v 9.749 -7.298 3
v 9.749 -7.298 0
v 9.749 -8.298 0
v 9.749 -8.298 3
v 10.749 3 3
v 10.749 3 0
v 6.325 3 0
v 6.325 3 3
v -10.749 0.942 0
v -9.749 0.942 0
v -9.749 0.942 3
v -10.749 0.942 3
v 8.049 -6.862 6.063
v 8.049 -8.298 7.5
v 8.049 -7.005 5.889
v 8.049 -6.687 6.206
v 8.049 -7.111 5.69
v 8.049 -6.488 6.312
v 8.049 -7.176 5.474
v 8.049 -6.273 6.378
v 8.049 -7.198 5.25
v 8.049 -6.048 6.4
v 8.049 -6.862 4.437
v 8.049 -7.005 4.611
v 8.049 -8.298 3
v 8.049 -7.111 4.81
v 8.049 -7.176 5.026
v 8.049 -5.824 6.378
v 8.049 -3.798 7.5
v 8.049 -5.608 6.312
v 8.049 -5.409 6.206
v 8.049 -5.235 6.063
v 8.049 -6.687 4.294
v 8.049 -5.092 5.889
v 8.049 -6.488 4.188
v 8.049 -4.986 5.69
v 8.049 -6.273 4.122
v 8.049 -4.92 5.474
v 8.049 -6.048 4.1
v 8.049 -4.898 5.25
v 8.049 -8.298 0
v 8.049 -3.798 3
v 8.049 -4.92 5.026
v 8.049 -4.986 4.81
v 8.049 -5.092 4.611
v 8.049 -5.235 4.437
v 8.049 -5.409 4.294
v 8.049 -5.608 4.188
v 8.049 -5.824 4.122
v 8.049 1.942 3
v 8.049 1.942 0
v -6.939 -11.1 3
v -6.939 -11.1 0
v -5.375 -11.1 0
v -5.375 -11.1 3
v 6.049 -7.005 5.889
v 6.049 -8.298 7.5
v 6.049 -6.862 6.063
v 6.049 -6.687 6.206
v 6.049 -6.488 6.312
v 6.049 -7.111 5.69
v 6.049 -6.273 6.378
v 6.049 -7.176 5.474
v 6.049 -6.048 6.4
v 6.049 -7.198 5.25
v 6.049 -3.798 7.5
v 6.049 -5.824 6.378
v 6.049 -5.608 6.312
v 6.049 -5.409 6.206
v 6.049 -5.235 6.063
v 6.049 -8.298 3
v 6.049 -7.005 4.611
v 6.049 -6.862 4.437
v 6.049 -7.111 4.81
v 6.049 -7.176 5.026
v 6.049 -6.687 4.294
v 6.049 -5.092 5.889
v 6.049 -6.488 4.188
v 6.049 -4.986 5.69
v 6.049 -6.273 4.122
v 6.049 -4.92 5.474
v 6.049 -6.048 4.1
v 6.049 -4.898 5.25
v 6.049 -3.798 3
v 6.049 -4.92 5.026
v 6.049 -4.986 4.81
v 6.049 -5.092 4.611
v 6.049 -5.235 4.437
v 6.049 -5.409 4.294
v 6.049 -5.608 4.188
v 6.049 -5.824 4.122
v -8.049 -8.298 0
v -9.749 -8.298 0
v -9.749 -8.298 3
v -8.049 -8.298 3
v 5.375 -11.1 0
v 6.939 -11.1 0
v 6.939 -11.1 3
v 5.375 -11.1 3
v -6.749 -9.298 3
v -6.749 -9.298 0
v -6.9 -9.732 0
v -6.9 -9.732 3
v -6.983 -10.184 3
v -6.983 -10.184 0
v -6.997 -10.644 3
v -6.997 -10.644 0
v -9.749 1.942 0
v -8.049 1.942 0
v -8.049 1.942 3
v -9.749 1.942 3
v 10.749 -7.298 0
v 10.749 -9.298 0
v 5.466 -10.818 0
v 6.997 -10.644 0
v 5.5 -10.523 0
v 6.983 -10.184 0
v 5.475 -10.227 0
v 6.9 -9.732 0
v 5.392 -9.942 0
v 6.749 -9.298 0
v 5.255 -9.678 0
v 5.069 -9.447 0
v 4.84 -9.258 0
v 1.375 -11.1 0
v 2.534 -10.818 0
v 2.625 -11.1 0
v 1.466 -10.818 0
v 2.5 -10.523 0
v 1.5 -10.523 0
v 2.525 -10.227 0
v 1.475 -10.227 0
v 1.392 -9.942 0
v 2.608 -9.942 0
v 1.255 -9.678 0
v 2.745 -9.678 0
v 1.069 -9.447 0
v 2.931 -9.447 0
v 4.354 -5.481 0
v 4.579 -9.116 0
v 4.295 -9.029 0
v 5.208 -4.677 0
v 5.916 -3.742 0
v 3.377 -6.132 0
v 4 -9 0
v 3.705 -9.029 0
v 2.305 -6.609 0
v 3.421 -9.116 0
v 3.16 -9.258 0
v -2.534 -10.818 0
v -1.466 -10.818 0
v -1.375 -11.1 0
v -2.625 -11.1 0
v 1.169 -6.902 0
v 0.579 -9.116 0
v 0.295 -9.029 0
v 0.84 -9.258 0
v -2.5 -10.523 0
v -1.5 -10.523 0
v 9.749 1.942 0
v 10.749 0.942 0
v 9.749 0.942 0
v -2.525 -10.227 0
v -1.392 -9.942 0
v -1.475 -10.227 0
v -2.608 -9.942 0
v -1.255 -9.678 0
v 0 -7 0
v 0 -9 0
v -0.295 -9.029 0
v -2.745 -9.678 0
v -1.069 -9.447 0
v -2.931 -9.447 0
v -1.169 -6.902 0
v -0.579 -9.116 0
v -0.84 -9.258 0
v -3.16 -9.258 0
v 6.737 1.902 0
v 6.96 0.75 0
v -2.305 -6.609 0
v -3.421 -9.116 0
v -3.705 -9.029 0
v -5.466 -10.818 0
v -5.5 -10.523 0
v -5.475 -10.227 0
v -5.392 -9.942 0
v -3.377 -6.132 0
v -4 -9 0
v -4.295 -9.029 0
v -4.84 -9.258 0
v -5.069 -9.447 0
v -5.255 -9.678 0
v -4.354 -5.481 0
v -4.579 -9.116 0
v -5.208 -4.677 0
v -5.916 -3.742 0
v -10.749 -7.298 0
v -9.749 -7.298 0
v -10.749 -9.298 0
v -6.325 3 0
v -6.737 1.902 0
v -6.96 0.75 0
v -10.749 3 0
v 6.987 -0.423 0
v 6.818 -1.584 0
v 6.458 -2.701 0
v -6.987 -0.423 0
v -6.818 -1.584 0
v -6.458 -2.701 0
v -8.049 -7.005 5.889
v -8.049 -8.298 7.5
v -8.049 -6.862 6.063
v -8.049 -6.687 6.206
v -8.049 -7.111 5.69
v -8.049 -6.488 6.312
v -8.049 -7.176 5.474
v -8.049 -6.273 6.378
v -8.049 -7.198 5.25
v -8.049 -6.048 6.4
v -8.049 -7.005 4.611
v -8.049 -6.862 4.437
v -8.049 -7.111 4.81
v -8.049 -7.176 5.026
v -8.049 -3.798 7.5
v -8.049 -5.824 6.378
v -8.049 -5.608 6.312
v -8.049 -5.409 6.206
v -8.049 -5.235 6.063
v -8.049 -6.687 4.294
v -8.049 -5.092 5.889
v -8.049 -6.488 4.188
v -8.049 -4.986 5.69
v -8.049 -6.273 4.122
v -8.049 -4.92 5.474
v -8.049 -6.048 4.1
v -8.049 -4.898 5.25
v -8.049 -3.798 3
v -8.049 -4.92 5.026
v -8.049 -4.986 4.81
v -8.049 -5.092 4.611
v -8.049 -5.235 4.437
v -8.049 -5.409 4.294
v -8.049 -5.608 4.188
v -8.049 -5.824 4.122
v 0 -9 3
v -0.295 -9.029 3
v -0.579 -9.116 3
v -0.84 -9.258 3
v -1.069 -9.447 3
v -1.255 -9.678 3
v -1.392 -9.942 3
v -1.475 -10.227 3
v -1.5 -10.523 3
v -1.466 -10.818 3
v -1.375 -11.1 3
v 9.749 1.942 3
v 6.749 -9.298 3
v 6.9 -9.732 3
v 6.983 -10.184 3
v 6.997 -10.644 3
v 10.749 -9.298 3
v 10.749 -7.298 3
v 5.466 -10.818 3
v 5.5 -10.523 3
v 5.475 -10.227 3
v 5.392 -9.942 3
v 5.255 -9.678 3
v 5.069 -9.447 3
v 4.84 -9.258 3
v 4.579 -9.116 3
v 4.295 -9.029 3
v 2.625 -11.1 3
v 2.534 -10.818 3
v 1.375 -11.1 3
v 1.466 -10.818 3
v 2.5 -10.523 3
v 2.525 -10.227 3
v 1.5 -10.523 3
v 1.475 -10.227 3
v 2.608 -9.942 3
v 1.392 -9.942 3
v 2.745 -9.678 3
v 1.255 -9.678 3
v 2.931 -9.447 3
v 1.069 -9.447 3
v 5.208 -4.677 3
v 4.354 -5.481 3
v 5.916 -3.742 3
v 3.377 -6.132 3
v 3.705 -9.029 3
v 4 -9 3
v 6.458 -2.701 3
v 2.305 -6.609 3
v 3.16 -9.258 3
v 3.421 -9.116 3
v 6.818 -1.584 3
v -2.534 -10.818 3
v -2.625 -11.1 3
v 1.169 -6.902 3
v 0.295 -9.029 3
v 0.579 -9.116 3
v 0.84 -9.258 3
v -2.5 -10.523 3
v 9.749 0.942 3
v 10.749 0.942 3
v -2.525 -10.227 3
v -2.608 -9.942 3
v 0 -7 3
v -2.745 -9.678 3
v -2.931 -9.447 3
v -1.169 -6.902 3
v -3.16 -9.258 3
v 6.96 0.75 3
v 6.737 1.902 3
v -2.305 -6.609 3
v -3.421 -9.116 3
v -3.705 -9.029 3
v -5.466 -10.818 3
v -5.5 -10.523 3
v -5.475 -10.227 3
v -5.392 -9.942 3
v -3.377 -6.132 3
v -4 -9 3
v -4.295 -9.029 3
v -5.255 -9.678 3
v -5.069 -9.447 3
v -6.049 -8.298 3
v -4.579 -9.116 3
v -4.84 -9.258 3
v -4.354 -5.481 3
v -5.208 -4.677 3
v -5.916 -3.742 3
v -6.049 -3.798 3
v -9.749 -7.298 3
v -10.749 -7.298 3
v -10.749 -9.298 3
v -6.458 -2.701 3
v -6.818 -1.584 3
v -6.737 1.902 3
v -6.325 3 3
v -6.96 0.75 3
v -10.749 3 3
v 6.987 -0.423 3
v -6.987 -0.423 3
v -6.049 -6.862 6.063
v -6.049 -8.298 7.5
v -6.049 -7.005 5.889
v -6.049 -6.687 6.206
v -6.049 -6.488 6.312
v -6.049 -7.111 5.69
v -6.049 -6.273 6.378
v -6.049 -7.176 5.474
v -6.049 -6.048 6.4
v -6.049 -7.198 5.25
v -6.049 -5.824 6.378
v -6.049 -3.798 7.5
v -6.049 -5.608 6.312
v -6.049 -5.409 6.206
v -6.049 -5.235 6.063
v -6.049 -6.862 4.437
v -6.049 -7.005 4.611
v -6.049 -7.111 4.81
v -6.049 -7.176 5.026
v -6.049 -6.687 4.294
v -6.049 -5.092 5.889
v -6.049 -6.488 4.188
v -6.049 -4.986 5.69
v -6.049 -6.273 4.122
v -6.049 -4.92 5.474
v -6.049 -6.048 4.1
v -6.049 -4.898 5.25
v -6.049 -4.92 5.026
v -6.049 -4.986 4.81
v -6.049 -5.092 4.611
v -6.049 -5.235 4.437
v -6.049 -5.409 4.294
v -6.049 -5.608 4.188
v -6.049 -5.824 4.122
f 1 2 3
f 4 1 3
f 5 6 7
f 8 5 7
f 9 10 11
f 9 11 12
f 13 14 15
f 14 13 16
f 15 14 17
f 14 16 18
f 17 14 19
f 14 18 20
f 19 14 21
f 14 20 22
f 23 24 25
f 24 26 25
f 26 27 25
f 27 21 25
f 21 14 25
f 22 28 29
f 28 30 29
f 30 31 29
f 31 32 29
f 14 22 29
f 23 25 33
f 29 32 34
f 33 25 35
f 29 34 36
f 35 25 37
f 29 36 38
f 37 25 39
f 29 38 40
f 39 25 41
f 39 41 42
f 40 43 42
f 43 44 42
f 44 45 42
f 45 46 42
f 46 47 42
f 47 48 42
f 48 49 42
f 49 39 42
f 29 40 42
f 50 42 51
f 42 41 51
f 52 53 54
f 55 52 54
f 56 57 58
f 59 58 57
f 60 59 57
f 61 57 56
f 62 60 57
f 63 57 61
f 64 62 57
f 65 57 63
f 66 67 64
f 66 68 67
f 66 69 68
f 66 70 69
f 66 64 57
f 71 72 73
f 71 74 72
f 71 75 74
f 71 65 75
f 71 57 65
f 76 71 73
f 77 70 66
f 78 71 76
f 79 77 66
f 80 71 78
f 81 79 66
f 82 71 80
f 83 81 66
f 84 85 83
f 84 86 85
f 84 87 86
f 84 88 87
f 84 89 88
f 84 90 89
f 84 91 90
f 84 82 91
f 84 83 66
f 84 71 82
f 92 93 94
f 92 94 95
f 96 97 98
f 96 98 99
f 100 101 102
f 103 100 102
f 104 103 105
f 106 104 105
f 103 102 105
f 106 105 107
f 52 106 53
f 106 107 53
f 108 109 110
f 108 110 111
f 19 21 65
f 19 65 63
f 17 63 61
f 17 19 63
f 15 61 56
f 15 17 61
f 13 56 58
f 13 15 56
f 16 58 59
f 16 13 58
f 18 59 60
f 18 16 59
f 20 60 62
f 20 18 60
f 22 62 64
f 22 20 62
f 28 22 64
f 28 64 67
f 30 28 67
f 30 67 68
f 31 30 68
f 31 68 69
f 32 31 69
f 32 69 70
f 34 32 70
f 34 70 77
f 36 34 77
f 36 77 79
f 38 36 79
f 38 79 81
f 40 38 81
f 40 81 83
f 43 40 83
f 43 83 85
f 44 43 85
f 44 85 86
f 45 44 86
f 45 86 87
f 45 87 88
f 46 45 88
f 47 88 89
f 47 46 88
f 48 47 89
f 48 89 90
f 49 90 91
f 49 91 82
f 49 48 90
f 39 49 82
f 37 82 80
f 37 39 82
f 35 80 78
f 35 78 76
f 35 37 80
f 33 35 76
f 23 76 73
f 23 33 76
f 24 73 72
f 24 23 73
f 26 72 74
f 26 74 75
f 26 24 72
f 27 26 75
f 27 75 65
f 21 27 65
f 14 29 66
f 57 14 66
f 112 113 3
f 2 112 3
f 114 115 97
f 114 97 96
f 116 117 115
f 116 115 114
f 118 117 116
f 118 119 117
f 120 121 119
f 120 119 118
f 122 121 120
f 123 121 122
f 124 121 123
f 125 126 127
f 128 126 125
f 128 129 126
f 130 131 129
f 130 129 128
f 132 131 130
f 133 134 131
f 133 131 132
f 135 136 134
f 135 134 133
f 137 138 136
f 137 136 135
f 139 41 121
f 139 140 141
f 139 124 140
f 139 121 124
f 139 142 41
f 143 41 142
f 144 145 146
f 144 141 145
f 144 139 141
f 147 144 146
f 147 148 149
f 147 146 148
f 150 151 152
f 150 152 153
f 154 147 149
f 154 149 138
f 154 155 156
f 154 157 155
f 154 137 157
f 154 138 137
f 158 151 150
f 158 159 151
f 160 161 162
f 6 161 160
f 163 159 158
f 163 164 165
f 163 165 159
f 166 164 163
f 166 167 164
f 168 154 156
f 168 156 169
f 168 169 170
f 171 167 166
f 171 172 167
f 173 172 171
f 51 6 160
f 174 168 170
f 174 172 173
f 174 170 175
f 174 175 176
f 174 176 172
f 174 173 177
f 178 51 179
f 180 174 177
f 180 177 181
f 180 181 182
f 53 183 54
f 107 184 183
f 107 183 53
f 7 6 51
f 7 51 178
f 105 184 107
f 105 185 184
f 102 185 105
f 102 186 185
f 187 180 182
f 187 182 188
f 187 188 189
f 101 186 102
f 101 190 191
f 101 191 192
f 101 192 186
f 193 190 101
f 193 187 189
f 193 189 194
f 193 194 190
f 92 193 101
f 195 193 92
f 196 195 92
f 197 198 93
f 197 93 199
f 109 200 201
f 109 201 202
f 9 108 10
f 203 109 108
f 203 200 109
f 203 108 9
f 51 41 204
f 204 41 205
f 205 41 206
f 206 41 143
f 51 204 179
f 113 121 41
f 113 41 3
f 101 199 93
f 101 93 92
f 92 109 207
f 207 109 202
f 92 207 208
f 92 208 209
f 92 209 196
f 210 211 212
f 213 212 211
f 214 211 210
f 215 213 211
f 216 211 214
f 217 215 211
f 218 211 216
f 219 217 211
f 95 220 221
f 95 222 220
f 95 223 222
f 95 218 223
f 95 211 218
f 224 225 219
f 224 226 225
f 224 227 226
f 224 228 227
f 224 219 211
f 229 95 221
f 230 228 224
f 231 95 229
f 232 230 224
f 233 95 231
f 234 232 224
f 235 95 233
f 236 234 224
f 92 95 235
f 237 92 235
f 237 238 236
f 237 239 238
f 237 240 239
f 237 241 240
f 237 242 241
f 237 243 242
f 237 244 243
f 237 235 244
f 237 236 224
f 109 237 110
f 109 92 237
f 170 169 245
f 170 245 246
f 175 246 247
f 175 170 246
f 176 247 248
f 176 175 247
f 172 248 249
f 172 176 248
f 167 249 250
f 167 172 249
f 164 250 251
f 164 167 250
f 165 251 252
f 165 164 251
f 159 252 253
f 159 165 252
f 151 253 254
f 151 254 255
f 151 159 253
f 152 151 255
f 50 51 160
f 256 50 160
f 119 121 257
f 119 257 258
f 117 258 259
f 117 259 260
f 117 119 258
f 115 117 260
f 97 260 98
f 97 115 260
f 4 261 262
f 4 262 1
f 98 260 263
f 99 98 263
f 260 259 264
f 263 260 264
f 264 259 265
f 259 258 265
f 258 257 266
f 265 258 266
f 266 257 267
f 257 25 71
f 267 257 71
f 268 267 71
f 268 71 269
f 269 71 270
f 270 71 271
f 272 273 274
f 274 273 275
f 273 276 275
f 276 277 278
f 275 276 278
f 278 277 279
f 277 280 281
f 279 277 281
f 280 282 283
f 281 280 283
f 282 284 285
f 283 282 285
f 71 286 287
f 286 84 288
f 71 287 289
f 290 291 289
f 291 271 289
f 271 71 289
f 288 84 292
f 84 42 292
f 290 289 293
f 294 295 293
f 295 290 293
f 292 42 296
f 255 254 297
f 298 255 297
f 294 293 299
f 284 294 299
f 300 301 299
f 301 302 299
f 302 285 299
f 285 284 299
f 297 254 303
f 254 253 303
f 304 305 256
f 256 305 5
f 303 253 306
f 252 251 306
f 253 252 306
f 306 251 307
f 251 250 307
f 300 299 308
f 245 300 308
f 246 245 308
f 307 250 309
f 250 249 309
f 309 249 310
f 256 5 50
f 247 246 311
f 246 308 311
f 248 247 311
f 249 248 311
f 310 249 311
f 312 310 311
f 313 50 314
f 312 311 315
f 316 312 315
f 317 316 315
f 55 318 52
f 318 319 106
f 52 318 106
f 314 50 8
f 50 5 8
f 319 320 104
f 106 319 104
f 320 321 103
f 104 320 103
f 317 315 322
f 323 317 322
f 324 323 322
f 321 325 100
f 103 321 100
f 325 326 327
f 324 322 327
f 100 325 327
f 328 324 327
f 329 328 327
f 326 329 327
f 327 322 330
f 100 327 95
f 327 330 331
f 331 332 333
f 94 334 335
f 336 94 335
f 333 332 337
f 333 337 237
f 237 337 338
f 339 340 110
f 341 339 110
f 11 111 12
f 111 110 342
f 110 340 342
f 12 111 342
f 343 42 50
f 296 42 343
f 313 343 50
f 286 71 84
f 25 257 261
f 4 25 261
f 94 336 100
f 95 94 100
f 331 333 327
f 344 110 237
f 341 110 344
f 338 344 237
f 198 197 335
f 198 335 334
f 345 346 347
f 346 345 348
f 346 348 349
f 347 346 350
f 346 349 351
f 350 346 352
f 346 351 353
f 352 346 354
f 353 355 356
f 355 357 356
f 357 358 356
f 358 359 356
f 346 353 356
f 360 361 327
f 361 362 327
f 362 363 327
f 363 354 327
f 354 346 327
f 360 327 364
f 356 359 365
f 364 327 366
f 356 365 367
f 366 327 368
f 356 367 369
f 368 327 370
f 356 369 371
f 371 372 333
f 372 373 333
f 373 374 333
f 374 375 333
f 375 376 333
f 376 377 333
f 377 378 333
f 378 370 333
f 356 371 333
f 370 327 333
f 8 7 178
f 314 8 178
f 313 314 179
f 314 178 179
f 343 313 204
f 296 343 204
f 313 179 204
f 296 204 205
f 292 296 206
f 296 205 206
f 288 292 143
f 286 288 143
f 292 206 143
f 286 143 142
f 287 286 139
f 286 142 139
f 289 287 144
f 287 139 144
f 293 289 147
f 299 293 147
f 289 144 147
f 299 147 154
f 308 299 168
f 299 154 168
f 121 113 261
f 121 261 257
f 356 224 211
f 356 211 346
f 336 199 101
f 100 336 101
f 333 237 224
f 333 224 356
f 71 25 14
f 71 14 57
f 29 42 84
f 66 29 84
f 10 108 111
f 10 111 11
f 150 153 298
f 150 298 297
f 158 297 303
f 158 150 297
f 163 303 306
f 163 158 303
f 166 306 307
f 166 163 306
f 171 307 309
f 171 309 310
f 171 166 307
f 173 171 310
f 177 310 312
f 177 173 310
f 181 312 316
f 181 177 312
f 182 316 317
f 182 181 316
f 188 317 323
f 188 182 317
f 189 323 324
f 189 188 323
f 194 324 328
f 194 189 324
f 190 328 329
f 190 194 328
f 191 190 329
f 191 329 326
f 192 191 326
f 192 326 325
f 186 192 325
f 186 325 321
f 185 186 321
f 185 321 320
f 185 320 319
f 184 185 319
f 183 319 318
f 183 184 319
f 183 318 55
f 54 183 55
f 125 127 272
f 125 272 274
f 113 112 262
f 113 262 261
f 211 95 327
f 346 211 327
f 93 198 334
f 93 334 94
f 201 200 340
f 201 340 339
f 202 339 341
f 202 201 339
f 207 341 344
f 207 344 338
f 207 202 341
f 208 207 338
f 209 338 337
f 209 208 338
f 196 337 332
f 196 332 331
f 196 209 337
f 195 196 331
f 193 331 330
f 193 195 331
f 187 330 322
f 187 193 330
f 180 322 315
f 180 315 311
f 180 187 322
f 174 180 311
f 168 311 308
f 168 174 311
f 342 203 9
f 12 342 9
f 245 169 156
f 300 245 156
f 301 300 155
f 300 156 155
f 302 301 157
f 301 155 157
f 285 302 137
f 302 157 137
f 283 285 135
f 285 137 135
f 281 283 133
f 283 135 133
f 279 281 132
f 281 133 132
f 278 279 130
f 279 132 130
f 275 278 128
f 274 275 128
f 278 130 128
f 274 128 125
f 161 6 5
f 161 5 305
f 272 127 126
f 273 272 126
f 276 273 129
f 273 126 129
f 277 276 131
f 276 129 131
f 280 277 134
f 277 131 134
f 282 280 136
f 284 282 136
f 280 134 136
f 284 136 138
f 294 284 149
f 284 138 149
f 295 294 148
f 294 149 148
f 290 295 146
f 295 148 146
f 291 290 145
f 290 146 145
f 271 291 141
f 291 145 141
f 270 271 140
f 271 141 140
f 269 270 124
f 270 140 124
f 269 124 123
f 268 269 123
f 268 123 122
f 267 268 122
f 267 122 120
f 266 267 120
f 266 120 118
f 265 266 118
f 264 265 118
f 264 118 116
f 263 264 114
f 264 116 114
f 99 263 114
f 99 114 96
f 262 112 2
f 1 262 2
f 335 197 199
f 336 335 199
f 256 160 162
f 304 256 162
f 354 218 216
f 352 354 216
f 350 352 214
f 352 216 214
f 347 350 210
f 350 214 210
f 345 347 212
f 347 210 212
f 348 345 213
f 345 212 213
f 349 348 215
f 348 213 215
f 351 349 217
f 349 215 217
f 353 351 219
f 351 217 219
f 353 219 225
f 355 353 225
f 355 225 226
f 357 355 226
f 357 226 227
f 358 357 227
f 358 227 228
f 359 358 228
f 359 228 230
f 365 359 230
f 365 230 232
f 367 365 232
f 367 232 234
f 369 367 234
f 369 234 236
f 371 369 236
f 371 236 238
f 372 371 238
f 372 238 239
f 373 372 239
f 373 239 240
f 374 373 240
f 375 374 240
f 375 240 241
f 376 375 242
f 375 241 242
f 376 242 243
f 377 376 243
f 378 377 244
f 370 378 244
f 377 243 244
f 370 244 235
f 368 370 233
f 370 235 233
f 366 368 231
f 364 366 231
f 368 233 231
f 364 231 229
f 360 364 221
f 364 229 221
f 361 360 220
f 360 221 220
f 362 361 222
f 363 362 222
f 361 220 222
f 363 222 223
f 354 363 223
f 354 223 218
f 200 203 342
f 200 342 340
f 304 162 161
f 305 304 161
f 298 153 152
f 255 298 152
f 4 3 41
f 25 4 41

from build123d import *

# Parameters (mm, degrees)
PAD_DEPTH    = 3
SKETCH001_W  = 2
SKETCH001_H  = 4.5
PAD001_DEPTH = 4.5
SKETCH002_R  = 1.15
POCKET_DEPTH = 5


with BuildPart() as pocket:
    # Sketch → Pad (new body)
    with BuildSketch(Plane.XY):
        with BuildLine():
            ThreePointArc((-6.324555, 3), (-5.91608, -3.741657), (0, -7))
            Line((0, -7), (0, -9))
            ThreePointArc((0, -9), (-1.25499, -9.678416), (-1.374773, -11.1))
            Line((-2.625227, -11.1), (-1.374773, -11.1))
            ThreePointArc((-2.625227, -11.1), (-4, -9), (-5.374773, -11.1))
            Line((-6.939388, -11.1), (-5.374773, -11.1))
            ThreePointArc((-6.748835, -9.298374), (-6.98336, -10.184459), (-6.939388, -11.1))
            Line((-10.748835, -9.298374), (-6.748835, -9.298374))
            Line((-10.748835, -7.298374), (-10.748835, -9.298374))
            Line((-10.748835, -7.298374), (-9.748835, -7.298374))
            Line((-9.748835, -7.298374), (-9.748835, -8.298374))
            Line((-9.748835, -8.298374), (-8.048835, -8.298374))
            Line((-8.048835, 1.941626), (-8.048835, -8.298374))
            Line((-8.048835, 1.941626), (-9.748835, 1.941626))
            Line((-9.748835, 1.941626), (-9.748835, 0.941626))
            Line((-9.748835, 0.941626), (-10.748835, 0.941626))
            Line((-10.748835, 3), (-10.748835, 0.941626))
            Line((-10.748835, 3), (-6.324555, 3))
        make_face()
    extrude(amount=PAD_DEPTH)

    # Sketch001 → Pad001 (new body)
    with BuildSketch(Plane.XY.offset(3)):
        with Locations((-7.048835, -6.048374)):
            Rectangle(SKETCH001_W, SKETCH001_H)
    extrude(amount=PAD001_DEPTH)

    # Sketch002 → Pocket (cut)
    with BuildSketch(Plane(origin=(-8.048835, 0, 0), x_dir=(0, -1, 0), z_dir=(-1, 0, 0))):
        with Locations((6.048374, 5.25)):
            Circle(SKETCH002_R)
    extrude(amount=-POCKET_DEPTH, mode=Mode.SUBTRACT)


with BuildPart() as fusion:
    # Part__Mirroring: instance of Pocket
    add(pocket.part.mirror(Plane(origin=(0, 0, 0), x_dir=(0, -1, 0), z_dir=(1, 0, 0))))

    # Fusion: union Pocket
    add(pocket.part)


solid = fusion.part
